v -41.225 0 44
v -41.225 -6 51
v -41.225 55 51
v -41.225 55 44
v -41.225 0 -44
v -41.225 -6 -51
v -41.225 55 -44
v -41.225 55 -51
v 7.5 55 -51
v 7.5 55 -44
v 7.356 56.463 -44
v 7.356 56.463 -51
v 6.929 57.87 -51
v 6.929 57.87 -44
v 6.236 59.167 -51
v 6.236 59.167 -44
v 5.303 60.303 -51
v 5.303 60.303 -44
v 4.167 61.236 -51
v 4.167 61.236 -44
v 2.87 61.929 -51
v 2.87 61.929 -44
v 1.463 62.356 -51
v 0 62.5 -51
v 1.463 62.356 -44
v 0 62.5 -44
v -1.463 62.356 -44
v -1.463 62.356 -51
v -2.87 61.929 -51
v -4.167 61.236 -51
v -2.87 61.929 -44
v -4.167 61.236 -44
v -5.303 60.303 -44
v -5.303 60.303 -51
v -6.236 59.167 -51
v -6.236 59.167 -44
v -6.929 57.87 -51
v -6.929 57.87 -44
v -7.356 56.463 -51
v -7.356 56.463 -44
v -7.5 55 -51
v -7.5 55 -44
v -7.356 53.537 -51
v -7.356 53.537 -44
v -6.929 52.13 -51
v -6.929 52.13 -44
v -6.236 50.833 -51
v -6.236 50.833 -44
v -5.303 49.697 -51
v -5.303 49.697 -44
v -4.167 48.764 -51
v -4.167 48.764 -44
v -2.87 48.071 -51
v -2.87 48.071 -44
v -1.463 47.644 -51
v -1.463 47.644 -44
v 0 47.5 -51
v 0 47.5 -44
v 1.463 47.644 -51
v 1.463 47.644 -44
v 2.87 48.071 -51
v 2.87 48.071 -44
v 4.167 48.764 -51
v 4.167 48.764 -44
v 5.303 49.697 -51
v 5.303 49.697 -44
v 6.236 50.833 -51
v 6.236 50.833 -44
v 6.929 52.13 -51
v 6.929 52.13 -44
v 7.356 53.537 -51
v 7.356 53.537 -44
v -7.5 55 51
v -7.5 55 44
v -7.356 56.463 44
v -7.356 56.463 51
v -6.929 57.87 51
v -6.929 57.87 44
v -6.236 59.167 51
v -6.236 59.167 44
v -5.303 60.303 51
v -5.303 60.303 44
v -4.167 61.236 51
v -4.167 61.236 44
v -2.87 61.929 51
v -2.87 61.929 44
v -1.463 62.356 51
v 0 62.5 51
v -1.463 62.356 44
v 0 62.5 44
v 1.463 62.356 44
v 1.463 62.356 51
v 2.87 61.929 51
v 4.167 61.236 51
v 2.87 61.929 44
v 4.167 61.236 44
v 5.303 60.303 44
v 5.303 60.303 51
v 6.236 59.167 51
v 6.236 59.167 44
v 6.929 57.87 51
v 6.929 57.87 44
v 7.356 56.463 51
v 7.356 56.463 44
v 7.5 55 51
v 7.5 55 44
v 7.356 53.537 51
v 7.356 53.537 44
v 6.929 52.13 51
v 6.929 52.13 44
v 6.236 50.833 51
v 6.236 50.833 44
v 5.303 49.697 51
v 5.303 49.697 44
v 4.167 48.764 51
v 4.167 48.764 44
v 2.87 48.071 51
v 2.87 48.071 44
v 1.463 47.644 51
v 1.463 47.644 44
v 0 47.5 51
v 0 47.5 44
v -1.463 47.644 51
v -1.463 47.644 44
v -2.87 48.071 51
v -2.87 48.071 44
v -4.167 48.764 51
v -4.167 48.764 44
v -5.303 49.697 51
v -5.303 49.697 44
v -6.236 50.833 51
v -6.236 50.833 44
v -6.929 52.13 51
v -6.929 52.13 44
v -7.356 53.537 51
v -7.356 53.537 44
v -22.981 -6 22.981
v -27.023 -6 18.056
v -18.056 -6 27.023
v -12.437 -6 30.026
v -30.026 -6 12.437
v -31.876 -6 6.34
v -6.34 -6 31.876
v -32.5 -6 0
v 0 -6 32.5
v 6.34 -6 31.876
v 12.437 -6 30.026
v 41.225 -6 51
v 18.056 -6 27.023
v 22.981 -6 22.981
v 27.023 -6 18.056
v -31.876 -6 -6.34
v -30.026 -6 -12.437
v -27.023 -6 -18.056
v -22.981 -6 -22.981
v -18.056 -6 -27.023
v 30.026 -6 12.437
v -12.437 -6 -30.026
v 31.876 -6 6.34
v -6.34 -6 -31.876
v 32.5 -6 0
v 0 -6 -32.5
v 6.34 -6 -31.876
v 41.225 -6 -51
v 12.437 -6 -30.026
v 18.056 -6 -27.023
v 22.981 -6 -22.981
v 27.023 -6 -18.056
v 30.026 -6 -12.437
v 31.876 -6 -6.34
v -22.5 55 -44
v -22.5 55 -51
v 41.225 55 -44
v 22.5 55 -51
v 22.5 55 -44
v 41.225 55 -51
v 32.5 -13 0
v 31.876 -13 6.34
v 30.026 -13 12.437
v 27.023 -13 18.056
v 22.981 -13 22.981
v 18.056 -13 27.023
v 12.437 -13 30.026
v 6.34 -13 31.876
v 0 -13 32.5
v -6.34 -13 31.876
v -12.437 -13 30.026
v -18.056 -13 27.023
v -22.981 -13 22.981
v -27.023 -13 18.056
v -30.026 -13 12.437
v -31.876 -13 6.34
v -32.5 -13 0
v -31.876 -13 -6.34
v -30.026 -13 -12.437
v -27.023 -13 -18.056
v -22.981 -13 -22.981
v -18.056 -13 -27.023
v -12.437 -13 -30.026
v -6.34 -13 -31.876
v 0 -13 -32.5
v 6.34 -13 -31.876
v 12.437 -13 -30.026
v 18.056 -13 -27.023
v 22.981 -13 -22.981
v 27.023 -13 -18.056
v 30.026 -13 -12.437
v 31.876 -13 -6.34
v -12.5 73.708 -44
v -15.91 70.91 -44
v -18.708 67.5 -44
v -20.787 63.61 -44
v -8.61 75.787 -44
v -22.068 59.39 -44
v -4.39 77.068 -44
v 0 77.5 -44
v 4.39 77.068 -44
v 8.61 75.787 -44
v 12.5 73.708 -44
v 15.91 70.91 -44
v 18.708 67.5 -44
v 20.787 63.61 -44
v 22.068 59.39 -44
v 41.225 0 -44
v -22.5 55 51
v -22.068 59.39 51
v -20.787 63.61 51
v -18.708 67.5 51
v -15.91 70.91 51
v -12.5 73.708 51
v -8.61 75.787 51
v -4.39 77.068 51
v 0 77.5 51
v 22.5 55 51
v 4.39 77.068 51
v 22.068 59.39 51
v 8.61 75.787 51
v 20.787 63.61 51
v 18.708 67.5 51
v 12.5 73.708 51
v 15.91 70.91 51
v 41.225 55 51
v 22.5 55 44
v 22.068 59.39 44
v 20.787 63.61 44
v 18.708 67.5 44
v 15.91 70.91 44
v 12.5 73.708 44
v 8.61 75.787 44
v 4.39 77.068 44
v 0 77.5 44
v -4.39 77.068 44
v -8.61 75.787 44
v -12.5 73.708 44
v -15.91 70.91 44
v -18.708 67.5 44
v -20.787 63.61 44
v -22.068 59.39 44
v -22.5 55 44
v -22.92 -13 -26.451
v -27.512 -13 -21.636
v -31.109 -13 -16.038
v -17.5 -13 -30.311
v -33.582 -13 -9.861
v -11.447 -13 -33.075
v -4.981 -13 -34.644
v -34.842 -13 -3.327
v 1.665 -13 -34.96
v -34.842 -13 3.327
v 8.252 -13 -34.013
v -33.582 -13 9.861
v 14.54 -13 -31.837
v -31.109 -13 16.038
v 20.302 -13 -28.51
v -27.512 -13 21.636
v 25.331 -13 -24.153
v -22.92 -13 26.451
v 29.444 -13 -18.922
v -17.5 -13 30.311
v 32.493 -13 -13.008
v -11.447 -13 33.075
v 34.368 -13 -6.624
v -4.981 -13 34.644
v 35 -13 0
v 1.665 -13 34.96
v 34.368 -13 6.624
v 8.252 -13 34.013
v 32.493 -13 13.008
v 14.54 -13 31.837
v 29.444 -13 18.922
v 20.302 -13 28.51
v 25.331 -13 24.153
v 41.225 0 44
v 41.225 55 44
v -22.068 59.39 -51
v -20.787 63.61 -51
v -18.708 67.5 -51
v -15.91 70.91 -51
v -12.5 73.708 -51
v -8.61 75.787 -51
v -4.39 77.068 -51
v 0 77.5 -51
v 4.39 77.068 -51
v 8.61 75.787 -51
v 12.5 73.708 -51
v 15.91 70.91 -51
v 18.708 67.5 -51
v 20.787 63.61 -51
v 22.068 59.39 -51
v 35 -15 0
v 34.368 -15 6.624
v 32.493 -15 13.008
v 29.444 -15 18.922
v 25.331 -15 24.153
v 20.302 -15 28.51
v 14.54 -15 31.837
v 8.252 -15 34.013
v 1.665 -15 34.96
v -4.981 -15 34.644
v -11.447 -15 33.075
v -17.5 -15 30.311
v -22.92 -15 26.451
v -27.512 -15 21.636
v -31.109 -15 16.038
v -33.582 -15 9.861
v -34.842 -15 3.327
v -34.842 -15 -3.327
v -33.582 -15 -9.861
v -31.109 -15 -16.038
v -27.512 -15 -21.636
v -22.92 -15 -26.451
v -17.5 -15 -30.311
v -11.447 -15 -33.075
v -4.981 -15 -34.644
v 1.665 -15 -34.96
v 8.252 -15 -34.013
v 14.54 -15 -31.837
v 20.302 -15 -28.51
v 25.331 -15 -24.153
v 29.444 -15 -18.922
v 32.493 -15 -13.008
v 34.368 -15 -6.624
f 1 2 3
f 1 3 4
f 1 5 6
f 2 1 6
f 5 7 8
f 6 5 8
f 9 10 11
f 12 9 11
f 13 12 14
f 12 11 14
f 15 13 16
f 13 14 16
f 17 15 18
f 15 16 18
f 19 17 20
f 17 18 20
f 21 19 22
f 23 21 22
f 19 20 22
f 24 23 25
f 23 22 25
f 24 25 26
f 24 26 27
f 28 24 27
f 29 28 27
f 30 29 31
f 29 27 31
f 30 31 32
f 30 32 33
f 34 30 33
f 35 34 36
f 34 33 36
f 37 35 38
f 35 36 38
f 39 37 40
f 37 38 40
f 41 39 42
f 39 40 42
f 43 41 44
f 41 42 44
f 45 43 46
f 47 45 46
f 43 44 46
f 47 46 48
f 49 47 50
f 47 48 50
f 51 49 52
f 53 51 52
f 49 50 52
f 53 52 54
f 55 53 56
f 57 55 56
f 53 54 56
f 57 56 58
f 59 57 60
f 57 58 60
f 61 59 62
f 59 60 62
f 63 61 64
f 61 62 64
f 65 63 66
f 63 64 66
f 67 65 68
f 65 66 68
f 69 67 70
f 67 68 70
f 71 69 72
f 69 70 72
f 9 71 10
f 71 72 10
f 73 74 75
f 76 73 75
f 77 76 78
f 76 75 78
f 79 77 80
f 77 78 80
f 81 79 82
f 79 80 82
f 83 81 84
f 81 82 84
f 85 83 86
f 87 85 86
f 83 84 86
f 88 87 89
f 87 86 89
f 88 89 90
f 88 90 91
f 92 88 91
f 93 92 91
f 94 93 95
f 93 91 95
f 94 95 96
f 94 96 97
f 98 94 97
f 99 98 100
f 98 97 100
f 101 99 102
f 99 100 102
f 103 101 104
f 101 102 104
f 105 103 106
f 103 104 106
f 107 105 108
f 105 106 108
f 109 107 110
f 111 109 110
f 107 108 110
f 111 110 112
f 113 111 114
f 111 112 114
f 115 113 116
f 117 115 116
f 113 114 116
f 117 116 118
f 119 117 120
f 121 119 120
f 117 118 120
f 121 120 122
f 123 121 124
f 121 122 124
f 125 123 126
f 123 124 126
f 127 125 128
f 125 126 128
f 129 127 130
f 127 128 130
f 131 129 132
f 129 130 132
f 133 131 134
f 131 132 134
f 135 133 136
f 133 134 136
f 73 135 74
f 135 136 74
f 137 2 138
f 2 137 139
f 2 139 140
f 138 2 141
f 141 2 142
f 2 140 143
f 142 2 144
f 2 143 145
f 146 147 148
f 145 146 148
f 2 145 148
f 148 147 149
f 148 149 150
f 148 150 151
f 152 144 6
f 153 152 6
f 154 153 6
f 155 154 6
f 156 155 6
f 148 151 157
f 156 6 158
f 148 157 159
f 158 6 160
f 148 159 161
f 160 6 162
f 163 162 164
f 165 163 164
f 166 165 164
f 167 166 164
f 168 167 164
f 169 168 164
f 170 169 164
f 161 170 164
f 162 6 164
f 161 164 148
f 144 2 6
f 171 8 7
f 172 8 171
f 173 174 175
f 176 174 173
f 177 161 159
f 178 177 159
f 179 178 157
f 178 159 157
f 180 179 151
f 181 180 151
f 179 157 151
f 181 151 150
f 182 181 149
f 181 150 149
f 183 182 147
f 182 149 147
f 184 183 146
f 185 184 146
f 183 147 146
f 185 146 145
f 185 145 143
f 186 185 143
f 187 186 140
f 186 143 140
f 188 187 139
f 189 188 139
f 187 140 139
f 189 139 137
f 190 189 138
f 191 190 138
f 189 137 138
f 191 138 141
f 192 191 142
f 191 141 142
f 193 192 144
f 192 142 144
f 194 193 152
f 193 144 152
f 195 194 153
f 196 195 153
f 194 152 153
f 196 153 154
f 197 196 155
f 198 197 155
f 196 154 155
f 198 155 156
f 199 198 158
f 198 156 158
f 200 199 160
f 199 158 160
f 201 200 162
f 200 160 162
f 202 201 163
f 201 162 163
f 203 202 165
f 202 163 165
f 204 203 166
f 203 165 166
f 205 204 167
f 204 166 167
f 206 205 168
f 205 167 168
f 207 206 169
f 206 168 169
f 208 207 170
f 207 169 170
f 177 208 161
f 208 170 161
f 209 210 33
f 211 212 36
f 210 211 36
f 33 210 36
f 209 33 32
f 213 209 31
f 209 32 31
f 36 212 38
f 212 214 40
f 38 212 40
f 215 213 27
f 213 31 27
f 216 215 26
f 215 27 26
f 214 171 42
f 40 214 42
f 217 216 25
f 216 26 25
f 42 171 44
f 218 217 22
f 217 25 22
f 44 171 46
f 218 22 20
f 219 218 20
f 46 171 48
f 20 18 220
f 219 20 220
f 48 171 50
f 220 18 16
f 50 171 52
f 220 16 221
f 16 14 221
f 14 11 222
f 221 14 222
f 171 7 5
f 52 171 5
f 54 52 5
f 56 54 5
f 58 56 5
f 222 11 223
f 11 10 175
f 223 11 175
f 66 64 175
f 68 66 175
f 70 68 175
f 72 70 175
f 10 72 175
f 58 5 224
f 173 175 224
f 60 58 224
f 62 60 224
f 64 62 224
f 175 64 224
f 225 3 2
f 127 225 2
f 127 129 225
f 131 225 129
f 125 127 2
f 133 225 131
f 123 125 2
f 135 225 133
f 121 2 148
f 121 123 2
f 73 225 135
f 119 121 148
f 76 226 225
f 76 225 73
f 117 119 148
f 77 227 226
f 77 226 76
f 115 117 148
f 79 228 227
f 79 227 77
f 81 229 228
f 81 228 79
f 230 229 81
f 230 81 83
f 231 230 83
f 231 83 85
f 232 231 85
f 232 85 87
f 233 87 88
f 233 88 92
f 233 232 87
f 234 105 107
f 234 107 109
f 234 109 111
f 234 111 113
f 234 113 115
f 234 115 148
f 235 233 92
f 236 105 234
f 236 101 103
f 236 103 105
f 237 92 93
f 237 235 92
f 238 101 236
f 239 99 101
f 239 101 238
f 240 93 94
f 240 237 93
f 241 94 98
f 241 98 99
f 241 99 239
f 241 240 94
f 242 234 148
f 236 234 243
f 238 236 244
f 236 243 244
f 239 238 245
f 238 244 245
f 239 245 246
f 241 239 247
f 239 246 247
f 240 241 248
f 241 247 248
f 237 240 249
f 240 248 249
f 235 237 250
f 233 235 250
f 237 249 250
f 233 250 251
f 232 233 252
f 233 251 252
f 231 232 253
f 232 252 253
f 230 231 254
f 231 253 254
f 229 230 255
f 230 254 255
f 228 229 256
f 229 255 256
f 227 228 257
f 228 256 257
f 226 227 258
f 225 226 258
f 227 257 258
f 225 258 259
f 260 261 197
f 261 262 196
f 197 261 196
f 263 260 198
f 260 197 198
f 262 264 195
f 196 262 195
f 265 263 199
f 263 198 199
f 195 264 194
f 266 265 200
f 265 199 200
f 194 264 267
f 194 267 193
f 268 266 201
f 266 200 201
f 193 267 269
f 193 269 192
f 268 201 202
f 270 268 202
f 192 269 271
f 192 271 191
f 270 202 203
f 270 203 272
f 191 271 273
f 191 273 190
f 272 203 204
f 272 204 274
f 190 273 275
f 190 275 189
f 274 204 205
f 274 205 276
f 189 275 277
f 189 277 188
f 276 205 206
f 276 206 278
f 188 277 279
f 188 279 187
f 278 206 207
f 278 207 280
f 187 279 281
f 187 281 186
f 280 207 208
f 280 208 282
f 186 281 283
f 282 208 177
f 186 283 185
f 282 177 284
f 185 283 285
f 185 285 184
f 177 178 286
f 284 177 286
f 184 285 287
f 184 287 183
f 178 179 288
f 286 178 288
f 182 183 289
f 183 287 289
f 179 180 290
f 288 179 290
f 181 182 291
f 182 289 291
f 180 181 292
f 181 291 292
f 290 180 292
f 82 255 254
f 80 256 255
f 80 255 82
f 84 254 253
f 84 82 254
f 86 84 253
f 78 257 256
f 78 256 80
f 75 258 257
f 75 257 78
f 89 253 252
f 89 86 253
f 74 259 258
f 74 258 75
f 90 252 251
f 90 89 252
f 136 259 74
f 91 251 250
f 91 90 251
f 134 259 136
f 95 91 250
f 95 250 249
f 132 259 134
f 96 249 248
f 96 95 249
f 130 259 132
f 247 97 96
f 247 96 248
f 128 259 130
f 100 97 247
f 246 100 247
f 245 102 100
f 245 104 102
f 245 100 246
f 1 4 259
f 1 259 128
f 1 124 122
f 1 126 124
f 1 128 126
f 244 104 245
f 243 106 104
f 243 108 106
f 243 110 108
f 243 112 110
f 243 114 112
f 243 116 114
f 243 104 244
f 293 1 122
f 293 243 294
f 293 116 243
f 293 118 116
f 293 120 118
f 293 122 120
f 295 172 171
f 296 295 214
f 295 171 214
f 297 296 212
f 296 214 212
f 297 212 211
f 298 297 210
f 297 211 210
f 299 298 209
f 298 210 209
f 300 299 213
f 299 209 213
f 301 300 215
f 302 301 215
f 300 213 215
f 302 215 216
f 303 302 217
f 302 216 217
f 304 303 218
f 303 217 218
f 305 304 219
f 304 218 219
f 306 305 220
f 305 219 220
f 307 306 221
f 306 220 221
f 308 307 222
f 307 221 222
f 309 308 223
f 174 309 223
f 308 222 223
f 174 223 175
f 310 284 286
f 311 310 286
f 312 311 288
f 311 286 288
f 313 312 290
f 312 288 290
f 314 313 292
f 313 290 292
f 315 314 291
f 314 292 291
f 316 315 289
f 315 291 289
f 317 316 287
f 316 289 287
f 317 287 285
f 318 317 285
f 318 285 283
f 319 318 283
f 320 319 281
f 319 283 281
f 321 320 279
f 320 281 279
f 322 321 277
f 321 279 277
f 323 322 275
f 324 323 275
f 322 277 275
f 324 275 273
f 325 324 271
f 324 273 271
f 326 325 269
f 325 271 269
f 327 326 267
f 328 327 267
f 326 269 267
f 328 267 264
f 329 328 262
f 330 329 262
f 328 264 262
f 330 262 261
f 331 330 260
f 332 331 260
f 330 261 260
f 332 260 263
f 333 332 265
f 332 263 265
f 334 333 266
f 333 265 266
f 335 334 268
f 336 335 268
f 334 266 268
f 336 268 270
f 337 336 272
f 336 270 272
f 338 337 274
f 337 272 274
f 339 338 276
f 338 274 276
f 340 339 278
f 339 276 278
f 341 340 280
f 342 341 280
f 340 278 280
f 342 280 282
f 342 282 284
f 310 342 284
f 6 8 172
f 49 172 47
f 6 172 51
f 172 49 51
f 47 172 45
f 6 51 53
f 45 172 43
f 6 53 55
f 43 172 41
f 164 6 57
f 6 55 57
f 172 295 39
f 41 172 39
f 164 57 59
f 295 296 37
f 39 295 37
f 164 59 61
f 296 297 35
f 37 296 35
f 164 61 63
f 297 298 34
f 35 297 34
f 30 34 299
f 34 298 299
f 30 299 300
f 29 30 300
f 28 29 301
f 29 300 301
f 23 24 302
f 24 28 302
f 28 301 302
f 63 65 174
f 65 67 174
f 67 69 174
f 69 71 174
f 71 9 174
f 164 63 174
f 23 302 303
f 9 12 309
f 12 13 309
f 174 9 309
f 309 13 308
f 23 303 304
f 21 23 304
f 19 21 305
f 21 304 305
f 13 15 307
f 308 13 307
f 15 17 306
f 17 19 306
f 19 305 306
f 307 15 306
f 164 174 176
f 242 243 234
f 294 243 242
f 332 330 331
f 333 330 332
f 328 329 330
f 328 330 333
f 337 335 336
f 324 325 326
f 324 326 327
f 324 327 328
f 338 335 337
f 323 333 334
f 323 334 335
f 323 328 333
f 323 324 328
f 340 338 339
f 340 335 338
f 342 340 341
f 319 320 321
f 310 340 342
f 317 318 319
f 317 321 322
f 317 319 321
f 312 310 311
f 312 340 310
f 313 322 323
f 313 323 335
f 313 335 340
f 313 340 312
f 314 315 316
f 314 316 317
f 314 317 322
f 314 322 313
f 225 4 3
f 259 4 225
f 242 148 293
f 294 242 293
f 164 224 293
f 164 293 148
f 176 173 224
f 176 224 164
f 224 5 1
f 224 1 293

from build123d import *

# Parameters (mm, degrees)
SKETCH1_W             = 82.45
SKETCH1_H             = 88
BOSS_EXTRUDE1_DEPTH   = 6
SKETCH2_W             = 82.45
SKETCH2_H             = 7
BOSS_EXTRUDE2_DEPTH   = 55
BOSS_EXTRUDE2_2_DEPTH = 55
SKETCH2_2_W           = 82.45
SKETCH2_2_H           = 7
BOSS_EXTRUDE3_DEPTH   = 6
SKETCH2_3_W           = 82.45
SKETCH2_3_H           = 7
BOSS_EXTRUDE4_DEPTH   = 6
BOSS_EXTRUDE5_DEPTH   = 7
BOSS_EXTRUDE7_DEPTH   = 7
SKETCH8_R             = 32.5
BOSS_EXTRUDE8_DEPTH   = 7
SKETCH9_R             = 35
BOSS_EXTRUDE9_DEPTH   = 2
SKETCH10_R            = 7.5
CUT_EXTRUDE3_DEPTH    = 7
SKETCH11_R            = 7.5
CUT_EXTRUDE4_DEPTH    = 7


with BuildPart() as part:
    # Sketch1 → Boss-Extrude1 (new body)
    with BuildSketch(Plane(origin=(0, 0, 0), x_dir=(1, 0, 0), z_dir=(0, 1, 0))):
        Rectangle(SKETCH1_W, SKETCH1_H)
    extrude(amount=-BOSS_EXTRUDE1_DEPTH)



with BuildPart() as body_2:
    # Sketch2 → Boss-Extrude2 (new body)
    with BuildSketch(Plane(origin=(0, 0, 0), x_dir=(1, 0, 0), z_dir=(0, 1, 0))):
        with Locations((0, 47.5)):
            Rectangle(SKETCH2_W, SKETCH2_H)
    extrude(amount=BOSS_EXTRUDE2_DEPTH)


with BuildPart() as body_3:
    # Sketch2 → Boss-Extrude2 2 (new body)
    with BuildSketch(Plane(origin=(0, 0, 0), x_dir=(1, 0, 0), z_dir=(0, 1, 0))):
        with Locations((0, -47.5)):
            Rectangle(SKETCH2_W, SKETCH2_H)
    extrude(amount=BOSS_EXTRUDE2_2_DEPTH)


with BuildPart() as part_1:
    add(part.part)

    add(body_2.part)  # Boss-Extrude3 merges body 2
    # Sketch2<2> → Boss-Extrude3 (add)
    with BuildSketch(Plane(origin=(0, 0, 0), x_dir=(1, 0, 0), z_dir=(0, 1, 0))):
        with Locations((0, 47.5)):
            Rectangle(SKETCH2_2_W, SKETCH2_2_H)
    extrude(amount=-BOSS_EXTRUDE3_DEPTH)


    add(body_3.part)  # Boss-Extrude4 merges body 3
    # Sketch2<3> → Boss-Extrude4 (add)
    with BuildSketch(Plane(origin=(0, 0, 0), x_dir=(1, 0, 0), z_dir=(0, 1, 0))):
        with Locations((0, -47.5)):
            Rectangle(SKETCH2_3_W, SKETCH2_3_H)
    extrude(amount=-BOSS_EXTRUDE4_DEPTH)

    # Sketch4 → Boss-Extrude5 (add)
    with BuildSketch(Plane.XY.offset(-44)):
        with BuildLine():
            Line((22.5, 55), (-22.5, 55))
            ThreePointArc((-22.5, 55), (0, 77.5), (22.5, 55))
        make_face()
    extrude(amount=-BOSS_EXTRUDE5_DEPTH)

    # Sketch5 → Boss-Extrude7 (add)
    with BuildSketch(Plane(origin=(0, 0, 44), x_dir=(-1, 0, 0), z_dir=(0, 0, -1))):
        with BuildLine():
            Line((22.5, 55), (-22.5, 55))
            ThreePointArc((-22.5, 55), (0, 77.5), (22.5, 55))
        make_face()
    extrude(amount=-BOSS_EXTRUDE7_DEPTH)

    # Sketch8 → Boss-Extrude8 (add)
    with BuildSketch(Plane.XZ.offset(6)):
        Circle(SKETCH8_R)
    extrude(amount=BOSS_EXTRUDE8_DEPTH)

    # Sketch9 → Boss-Extrude9 (add)
    with BuildSketch(Plane.XZ.offset(13)):
        Circle(SKETCH9_R)
    extrude(amount=BOSS_EXTRUDE9_DEPTH)

    # Sketch10 → Cut-Extrude3 (cut)
    with BuildSketch(Plane.XY.offset(-44)):
        with Locations((0, 55)):
            Circle(SKETCH10_R)
    extrude(amount=-CUT_EXTRUDE3_DEPTH, mode=Mode.SUBTRACT)

    # Sketch11 → Cut-Extrude4 (cut)
    with BuildSketch(Plane(origin=(0, 0, 44), x_dir=(-1, 0, 0), z_dir=(0, 0, -1))):
        with Locations((0, 55)):
            Circle(SKETCH11_R)
    extrude(amount=-CUT_EXTRUDE4_DEPTH, mode=Mode.SUBTRACT)


solid = part_1.part
